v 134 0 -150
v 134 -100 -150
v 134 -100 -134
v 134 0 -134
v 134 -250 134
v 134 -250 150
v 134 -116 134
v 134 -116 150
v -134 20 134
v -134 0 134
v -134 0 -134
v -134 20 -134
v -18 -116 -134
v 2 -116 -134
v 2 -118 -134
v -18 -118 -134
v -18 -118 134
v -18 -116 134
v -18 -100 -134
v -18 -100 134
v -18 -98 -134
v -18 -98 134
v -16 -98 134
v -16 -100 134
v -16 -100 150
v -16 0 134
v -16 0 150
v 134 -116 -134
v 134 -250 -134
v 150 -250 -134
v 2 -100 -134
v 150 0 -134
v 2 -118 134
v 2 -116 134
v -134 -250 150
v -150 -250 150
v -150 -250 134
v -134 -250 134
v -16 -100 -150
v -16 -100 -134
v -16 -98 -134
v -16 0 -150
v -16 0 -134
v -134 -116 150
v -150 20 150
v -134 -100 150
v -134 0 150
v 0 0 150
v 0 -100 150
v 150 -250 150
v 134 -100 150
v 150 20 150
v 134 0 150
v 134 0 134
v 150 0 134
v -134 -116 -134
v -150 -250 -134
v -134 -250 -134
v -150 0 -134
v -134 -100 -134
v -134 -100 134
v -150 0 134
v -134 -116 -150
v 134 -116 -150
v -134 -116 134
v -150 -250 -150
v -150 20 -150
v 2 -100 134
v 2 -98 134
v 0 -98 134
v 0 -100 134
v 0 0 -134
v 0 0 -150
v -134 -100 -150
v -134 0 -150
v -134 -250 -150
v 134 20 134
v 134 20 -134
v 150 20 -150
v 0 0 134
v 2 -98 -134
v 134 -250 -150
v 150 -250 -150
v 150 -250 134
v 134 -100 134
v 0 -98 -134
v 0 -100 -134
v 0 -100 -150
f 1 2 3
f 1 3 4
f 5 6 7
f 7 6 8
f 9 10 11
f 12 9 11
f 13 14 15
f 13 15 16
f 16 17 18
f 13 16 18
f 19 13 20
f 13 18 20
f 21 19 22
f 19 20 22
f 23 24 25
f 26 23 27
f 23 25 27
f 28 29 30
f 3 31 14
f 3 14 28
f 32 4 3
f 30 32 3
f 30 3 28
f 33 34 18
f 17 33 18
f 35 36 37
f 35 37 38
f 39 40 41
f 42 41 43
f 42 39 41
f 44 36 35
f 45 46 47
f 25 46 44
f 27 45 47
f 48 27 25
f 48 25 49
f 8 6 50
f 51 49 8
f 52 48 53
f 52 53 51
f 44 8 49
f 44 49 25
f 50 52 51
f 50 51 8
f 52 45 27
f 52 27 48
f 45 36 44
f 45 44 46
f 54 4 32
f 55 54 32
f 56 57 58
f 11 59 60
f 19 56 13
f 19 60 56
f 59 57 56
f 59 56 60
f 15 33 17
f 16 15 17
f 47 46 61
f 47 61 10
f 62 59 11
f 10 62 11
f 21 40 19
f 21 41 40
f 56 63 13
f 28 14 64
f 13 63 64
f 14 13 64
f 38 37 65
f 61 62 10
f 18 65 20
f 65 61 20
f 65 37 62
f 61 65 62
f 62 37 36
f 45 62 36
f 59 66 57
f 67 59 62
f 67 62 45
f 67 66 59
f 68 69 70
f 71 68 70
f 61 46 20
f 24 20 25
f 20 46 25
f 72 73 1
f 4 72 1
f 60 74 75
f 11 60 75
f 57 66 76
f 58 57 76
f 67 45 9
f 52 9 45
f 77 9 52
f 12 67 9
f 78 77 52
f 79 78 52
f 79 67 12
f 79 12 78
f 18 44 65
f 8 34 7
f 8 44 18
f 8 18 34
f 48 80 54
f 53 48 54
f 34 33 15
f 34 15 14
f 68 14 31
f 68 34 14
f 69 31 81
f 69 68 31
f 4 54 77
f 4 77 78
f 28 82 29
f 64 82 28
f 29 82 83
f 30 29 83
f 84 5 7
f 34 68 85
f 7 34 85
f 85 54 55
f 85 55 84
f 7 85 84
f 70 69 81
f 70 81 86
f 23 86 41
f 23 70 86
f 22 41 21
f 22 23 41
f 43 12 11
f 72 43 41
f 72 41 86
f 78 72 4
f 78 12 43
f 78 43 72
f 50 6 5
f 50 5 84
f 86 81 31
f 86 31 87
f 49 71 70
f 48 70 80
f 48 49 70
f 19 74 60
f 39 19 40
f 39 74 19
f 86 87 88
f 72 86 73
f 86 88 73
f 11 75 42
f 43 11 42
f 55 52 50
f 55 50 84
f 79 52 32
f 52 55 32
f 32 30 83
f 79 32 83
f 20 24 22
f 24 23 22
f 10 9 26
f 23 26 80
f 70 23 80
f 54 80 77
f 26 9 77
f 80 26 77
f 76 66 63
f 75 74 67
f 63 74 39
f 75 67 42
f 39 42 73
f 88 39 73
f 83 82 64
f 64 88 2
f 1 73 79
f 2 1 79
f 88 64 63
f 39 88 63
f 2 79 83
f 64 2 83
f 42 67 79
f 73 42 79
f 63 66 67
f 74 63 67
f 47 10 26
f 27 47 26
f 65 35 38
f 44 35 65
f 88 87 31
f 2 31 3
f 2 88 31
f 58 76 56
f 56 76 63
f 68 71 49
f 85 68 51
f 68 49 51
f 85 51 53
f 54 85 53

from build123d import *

# Parameters (mm, degrees)
SKETCH1_W           = 300
SKETCH1_H           = 300
SKETCH1_W_2         = 268
SKETCH1_H_2         = 268
BOSS_EXTRUDE1_DEPTH = 20
SKETCH3_W           = 16
SKETCH3_H           = 100
BOSS_EXTRUDE2_DEPTH = 16
SKETCH4_W           = 16
SKETCH4_H           = 250
BOSS_EXTRUDE3_DEPTH = 16
SKETCH5_W           = 268
SKETCH5_H           = 16
BOSS_EXTRUDE4_DEPTH = 16
SKETCH6_W           = 20
SKETCH6_H           = 20
BOSS_EXTRUDE5_DEPTH = 268


with BuildPart() as part:
    # Sketch1 → Boss-Extrude1 (new body)
    with BuildSketch(Plane(origin=(0, 0, 0), x_dir=(1, 0, 0), z_dir=(0, 1, 0))):
        Rectangle(SKETCH1_W, SKETCH1_H)
        Rectangle(SKETCH1_W_2, SKETCH1_H_2, mode=Mode.SUBTRACT)
    extrude(amount=BOSS_EXTRUDE1_DEPTH)

    # Sketch3 → Boss-Extrude2 (add)
    with BuildSketch(Plane.XY.offset(150)):
        with Locations((-8, -50)):
            Rectangle(SKETCH3_W, SKETCH3_H)
    boss_extrude2 = extrude(amount=-BOSS_EXTRUDE2_DEPTH)

    # Sketch4 → Boss-Extrude3 (add)
    with BuildSketch(Plane.XY.offset(150)):
        with Locations((-142, -125)):
            Rectangle(SKETCH4_W, SKETCH4_H)
        with Locations((142, -125)):
            Rectangle(SKETCH4_W, SKETCH4_H)
    boss_extrude3 = extrude(amount=-BOSS_EXTRUDE3_DEPTH)

    # Sketch5 → Boss-Extrude4 (add)
    with BuildSketch(Plane.XY.offset(150)):
        with Locations((0, -108)):
            Rectangle(SKETCH5_W, SKETCH5_H)
    boss_extrude4 = extrude(amount=-BOSS_EXTRUDE4_DEPTH)

    # Mirror1: Boss-Extrude2, Boss-Extrude3, Boss-Extrude4 across plane
    add(boss_extrude2.mirror(Plane.XY))
    add(boss_extrude3.mirror(Plane.XY))
    add(boss_extrude4.mirror(Plane.XY))

    # Sketch6 → Boss-Extrude5 (add)
    with BuildSketch(Plane(origin=(0, 0, 134), x_dir=(-1, 0, 0), z_dir=(0, 0, -1))):
        with Locations((8, -108)):
            Rectangle(SKETCH6_W, SKETCH6_H)
    extrude(amount=BOSS_EXTRUDE5_DEPTH)


solid = part.part
